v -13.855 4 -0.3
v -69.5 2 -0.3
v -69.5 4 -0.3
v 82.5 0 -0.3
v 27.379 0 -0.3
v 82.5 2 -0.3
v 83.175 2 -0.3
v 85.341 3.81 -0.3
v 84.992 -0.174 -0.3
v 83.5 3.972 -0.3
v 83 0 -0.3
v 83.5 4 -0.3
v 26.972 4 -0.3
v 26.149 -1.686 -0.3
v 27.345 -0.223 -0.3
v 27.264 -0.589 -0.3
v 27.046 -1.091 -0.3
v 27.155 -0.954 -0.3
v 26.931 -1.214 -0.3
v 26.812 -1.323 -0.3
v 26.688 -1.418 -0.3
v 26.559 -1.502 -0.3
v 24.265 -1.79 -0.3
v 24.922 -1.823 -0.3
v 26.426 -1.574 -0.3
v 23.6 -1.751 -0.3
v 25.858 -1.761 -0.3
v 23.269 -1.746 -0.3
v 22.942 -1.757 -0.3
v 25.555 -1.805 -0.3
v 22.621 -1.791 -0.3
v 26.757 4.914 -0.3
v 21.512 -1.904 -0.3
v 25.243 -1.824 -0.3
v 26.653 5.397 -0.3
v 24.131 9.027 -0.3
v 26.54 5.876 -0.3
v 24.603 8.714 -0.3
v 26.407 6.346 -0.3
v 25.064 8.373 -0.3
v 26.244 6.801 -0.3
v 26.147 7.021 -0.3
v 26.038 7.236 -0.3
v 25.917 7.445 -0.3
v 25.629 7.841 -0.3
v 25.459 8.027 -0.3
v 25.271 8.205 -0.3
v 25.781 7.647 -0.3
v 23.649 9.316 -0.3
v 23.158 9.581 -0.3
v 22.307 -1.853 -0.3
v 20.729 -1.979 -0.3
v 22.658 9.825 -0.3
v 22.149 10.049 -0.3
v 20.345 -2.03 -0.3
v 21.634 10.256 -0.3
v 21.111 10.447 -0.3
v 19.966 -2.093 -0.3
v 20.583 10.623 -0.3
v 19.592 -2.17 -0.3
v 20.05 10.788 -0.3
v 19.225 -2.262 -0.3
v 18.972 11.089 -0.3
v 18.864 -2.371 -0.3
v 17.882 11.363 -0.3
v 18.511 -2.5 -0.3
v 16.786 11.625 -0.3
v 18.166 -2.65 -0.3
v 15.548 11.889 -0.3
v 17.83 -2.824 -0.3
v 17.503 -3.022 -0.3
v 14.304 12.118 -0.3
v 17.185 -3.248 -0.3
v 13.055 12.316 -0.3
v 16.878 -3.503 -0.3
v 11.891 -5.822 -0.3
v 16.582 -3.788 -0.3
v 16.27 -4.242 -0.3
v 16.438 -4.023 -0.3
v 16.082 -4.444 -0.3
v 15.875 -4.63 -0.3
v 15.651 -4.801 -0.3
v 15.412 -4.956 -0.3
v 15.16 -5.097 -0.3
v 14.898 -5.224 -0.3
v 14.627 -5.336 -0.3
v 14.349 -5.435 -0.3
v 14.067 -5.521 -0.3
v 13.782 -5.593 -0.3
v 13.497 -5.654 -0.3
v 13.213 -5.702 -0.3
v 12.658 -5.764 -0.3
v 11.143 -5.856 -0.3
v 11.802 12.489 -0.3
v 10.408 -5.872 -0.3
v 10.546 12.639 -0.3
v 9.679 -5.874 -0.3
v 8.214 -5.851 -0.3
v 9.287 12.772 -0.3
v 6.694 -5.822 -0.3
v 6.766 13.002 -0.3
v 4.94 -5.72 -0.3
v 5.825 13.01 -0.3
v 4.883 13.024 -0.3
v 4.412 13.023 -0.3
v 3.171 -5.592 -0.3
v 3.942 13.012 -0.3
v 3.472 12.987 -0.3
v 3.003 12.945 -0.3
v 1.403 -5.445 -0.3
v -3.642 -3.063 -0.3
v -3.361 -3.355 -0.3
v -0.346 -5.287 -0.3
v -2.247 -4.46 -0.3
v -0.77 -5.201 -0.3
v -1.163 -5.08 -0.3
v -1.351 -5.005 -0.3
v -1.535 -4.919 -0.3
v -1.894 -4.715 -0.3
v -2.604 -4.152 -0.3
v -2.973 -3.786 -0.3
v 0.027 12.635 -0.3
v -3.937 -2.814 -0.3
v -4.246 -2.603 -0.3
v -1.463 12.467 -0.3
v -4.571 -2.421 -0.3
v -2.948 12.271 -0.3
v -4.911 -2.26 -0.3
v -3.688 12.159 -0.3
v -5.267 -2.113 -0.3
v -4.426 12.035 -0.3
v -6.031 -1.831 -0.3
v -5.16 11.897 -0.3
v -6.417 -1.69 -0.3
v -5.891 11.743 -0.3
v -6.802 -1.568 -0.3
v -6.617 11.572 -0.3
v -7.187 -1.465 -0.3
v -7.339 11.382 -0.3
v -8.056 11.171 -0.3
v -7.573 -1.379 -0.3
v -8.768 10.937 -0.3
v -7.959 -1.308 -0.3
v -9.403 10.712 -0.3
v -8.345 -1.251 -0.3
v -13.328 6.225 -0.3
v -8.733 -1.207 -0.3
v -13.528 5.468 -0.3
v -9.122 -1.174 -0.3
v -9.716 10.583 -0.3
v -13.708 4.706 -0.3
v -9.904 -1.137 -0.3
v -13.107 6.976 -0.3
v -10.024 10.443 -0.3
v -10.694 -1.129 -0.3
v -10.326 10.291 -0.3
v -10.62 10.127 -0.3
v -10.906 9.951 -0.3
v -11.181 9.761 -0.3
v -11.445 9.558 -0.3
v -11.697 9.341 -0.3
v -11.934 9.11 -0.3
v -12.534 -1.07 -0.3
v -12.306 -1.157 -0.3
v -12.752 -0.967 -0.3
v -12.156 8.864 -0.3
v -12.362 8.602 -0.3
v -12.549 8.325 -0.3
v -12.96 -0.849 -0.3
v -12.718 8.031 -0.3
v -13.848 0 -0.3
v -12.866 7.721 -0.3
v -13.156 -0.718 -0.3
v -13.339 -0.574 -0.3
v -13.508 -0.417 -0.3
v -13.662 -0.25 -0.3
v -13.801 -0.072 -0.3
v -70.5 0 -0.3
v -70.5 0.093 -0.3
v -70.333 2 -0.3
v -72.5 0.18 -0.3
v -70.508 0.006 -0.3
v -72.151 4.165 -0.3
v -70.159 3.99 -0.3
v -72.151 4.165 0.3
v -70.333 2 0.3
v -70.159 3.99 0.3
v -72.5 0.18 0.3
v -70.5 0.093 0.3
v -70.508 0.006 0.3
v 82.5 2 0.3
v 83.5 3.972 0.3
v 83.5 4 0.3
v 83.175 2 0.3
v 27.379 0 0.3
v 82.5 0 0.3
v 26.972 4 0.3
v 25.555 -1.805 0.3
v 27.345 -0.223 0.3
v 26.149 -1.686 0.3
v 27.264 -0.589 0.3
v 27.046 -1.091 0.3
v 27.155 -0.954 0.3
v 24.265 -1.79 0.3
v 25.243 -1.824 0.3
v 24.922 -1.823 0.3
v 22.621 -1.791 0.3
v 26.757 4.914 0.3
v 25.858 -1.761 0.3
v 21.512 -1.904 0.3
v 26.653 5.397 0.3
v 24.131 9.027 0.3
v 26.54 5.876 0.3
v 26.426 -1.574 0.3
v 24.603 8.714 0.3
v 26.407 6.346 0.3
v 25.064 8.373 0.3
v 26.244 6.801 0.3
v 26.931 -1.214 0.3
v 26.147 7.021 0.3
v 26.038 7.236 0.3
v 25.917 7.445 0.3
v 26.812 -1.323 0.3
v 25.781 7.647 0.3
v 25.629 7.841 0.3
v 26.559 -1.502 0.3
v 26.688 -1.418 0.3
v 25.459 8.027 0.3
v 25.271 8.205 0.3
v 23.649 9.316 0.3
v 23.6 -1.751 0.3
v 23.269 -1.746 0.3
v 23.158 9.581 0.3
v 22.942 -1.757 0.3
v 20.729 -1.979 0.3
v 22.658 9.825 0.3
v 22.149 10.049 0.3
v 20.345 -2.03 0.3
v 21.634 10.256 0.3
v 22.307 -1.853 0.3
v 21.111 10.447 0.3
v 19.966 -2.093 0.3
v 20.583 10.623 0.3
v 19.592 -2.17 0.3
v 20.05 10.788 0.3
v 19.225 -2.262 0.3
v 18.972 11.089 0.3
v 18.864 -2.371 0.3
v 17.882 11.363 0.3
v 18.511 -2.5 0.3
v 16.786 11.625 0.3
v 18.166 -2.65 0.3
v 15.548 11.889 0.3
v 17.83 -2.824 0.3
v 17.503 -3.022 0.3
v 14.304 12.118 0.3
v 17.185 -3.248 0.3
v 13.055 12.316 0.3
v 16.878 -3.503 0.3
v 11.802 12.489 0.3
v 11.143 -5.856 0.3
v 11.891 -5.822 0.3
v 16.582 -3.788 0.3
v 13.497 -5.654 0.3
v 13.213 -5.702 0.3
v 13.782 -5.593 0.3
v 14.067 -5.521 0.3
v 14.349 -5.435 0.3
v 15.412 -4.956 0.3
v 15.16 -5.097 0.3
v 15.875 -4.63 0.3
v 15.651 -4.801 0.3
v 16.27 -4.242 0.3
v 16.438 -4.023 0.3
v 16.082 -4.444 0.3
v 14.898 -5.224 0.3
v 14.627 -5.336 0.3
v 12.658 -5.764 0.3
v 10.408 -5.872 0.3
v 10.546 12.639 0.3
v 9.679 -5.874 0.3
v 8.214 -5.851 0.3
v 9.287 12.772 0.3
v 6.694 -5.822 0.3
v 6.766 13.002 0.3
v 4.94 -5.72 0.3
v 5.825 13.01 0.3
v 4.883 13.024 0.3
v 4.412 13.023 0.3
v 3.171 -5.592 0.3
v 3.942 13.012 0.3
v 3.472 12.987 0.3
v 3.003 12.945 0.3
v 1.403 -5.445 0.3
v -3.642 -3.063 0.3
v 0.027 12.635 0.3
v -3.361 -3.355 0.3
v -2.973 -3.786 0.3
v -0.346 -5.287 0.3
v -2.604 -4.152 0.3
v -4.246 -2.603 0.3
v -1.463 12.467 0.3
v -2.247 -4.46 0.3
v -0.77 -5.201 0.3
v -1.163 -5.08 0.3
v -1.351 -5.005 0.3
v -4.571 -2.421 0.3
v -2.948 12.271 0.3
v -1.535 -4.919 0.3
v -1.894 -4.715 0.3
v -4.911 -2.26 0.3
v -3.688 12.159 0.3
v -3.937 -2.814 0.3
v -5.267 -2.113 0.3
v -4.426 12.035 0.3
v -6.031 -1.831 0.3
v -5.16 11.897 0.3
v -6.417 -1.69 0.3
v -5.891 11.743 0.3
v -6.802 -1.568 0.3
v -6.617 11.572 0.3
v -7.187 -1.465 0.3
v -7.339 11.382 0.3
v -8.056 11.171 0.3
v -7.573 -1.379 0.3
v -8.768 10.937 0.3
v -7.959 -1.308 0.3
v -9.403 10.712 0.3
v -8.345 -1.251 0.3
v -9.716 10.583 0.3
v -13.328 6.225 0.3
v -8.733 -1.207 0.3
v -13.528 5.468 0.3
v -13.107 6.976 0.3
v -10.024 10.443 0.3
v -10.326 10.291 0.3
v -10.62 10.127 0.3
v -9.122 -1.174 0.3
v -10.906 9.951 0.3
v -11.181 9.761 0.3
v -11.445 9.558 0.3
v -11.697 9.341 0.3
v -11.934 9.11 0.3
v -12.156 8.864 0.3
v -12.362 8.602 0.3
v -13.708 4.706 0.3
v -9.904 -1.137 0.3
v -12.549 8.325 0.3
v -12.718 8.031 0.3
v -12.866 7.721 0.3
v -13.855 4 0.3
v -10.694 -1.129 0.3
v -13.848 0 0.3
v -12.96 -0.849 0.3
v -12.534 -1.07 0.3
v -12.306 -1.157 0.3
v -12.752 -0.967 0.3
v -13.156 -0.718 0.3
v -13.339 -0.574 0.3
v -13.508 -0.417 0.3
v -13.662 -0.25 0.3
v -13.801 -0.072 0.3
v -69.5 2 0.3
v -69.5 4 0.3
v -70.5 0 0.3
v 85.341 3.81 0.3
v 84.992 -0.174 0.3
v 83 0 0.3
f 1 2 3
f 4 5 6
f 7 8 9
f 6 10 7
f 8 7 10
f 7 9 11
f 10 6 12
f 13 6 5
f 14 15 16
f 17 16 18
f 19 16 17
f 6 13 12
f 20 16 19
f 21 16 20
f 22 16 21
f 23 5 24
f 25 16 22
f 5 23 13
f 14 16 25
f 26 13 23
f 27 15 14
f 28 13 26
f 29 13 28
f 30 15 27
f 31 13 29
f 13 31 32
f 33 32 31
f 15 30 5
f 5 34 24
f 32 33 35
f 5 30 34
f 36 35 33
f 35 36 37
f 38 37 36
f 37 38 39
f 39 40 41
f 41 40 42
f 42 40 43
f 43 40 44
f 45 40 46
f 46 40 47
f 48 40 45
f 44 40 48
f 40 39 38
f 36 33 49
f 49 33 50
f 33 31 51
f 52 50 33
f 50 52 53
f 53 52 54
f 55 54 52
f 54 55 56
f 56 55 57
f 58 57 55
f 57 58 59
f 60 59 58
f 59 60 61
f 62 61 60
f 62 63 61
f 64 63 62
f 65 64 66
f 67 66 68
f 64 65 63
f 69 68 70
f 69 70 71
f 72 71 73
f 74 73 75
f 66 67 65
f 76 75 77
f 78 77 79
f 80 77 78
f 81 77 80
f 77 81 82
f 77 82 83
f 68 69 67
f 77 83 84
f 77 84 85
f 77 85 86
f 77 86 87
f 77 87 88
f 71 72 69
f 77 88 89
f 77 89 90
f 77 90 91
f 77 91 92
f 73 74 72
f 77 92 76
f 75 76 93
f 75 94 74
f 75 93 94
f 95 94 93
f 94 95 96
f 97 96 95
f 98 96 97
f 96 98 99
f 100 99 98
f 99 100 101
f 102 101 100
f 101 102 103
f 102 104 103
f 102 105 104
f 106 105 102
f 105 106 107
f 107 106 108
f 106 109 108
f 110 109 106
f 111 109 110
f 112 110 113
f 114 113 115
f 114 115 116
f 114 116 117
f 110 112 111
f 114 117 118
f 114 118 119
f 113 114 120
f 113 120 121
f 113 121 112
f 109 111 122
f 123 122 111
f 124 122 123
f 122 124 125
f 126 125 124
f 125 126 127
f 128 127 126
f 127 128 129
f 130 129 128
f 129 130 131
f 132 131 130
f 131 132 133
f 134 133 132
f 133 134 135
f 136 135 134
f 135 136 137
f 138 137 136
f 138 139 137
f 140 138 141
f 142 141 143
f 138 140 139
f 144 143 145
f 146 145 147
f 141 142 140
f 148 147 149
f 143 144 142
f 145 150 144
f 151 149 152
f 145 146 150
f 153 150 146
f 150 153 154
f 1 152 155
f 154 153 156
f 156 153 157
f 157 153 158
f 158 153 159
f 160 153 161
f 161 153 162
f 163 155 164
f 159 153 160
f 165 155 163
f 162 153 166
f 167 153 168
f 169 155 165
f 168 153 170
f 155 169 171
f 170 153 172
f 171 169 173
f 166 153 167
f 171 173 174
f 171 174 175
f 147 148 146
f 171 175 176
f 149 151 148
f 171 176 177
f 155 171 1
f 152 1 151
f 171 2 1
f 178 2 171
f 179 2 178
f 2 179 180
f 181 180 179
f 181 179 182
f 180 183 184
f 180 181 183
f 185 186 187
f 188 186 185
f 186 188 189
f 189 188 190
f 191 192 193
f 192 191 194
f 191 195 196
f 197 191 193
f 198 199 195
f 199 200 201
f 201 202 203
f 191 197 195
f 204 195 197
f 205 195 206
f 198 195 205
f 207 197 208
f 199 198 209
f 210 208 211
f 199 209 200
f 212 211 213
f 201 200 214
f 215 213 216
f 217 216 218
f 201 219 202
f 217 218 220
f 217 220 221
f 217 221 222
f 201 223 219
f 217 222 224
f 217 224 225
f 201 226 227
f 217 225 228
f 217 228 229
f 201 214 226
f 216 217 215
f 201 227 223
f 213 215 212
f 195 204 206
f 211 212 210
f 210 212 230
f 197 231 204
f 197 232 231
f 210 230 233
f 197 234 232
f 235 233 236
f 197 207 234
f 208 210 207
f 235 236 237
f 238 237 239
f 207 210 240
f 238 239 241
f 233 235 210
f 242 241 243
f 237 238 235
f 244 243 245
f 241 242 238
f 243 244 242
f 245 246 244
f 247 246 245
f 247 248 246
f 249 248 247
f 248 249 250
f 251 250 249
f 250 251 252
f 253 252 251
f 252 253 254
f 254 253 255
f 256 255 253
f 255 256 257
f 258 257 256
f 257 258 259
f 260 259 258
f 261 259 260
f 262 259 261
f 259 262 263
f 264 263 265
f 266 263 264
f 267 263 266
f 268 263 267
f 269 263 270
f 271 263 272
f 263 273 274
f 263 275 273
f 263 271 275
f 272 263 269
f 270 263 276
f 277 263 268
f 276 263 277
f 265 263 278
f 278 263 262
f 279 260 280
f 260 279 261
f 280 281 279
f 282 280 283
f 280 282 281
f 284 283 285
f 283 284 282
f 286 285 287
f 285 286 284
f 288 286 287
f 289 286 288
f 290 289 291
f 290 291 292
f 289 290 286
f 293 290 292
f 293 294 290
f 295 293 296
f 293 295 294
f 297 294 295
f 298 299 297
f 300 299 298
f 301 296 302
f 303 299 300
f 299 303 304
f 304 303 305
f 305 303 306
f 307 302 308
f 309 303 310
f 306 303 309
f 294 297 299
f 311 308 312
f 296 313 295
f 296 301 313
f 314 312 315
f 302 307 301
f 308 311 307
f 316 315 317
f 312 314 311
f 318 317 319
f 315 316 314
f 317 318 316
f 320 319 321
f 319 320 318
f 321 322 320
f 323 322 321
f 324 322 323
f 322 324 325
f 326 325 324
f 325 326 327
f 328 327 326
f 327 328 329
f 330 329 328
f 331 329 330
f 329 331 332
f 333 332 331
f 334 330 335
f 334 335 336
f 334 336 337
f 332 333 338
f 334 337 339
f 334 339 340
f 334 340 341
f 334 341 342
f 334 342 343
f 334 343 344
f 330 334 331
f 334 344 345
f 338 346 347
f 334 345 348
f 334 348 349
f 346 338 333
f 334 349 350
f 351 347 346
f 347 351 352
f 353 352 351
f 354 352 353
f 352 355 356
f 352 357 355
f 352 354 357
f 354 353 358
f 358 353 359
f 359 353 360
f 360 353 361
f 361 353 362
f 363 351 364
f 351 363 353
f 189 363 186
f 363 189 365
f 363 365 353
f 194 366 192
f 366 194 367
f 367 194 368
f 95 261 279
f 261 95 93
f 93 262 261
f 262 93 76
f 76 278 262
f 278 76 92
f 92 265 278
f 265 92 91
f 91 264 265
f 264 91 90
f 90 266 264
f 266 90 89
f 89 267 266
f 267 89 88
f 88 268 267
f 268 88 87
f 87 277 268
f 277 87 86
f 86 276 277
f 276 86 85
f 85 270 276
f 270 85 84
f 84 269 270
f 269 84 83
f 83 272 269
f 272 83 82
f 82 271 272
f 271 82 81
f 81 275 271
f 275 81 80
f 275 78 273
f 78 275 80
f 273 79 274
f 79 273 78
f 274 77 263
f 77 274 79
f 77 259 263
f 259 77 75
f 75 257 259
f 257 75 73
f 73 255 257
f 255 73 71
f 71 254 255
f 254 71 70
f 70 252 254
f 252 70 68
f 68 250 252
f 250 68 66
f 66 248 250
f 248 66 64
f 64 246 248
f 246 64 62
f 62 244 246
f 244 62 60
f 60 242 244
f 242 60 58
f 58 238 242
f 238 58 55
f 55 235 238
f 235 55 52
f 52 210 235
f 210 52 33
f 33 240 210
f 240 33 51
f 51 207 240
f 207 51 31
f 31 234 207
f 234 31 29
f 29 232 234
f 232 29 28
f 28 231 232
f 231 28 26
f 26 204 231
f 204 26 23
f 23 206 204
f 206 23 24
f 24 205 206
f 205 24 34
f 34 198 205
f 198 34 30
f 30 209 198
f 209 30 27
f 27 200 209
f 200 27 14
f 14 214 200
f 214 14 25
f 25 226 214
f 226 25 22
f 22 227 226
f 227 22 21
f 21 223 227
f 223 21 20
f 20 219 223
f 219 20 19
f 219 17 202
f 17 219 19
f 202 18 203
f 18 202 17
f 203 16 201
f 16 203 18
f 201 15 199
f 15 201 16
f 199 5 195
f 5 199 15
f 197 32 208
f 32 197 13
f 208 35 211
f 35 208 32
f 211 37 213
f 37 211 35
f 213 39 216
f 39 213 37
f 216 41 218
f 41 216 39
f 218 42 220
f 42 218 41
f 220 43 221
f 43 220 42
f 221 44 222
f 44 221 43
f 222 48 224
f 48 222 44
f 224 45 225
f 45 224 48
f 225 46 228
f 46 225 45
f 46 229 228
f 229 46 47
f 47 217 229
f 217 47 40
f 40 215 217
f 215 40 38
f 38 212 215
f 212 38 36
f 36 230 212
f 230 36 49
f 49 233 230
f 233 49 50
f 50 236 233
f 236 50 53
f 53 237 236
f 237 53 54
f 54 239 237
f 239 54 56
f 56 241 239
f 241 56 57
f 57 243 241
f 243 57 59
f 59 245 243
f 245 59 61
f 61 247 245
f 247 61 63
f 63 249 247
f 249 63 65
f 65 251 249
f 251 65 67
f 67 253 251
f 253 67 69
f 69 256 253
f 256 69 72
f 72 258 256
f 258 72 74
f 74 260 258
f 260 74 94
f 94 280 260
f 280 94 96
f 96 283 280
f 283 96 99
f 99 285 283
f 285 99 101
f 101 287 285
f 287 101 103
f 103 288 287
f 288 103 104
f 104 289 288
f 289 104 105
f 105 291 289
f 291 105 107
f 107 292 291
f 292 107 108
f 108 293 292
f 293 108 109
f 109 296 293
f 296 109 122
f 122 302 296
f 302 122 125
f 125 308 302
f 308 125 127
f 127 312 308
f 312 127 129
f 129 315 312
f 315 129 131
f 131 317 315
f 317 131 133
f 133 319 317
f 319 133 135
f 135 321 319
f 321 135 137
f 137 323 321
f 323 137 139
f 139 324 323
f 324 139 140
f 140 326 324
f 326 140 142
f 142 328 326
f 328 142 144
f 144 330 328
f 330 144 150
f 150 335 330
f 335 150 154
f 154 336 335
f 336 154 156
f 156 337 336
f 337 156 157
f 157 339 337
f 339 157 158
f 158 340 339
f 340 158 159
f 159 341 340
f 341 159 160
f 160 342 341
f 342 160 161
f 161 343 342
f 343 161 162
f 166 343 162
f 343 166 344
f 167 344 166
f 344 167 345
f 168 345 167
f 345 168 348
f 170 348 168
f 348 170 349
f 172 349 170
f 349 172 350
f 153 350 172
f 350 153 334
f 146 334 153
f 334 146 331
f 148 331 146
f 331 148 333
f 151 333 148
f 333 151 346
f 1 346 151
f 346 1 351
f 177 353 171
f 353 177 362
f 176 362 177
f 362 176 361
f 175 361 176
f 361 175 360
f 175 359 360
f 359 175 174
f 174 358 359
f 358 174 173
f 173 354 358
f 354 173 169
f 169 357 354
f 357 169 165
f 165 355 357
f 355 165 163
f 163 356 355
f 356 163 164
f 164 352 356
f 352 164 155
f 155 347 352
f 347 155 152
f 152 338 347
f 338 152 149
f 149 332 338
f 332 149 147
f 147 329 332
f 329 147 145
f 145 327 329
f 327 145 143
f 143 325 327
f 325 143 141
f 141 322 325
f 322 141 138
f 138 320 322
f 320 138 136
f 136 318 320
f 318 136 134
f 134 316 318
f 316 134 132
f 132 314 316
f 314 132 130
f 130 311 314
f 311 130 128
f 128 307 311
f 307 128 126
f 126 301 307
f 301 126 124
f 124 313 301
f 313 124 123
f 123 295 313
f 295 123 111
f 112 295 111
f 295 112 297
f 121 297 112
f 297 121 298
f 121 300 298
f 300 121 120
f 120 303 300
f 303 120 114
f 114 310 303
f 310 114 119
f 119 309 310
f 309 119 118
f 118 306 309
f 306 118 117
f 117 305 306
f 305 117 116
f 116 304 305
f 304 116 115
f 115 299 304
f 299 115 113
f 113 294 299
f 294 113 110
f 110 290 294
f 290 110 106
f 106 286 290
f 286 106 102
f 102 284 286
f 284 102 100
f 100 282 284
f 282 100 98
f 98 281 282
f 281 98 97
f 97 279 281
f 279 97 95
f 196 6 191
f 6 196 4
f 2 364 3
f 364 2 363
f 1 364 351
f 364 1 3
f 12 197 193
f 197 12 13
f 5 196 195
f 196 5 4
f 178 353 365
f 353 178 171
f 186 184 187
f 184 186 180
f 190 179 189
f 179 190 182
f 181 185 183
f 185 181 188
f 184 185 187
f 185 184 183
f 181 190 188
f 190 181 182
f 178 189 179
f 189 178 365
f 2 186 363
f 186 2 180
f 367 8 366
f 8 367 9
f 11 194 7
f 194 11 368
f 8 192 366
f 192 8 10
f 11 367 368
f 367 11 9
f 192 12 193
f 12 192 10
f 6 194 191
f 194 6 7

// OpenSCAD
File = "HeadLampLens.dxf";
Width = 42;
Height = 19;
Thickness = .6;
MountSize = 2;
DXFWidthOffset = 6.5;
StrapLength = 55;

echo(str("Width Scale: ", Width / dxf_dim(file = File, name = "total_width")));
echo(str("Height Scale: ", Height / dxf_dim(file = File, name = "total_height")));


linear_extrude(height = Thickness, center = true, convexity = 10) scale([42/dxf_dim(file = "HeadLampLens.dxf", name = "total_width"),19/dxf_dim(file = "HeadLampLens.dxf", name = "total_height"),0]) import(file = File,  layer = "Layer");

// Strap
translate([DXFWidthOffset - StrapLength - Width/2,0,-.3]) cube([StrapLength+StrapLength+Width, 4, .6]);
// Side latch
translate([DXFWidthOffset - StrapLength - Width/2 -3,.18,-.3]) rotate(a=-5) cube([2, 4, .6]);
translate([DXFWidthOffset - StrapLength - Width/2 -1,0,-.3]) cube([1, 2, .6]);
// Side latch
translate([-(DXFWidthOffset - StrapLength - Width) -7.5,0,-.3]) rotate(a=-5) cube([2, 4, .6]);
translate([-(DXFWidthOffset - StrapLength - Width) -8,2,-.3]) cube([1, 2, .6]);


// Mounting Balls
//translate([Width/2 + DXFWidthOffset - MountSize,0,MountSize]) sphere(r=MountSize, center=true);
//translate([-Width/2 + DXFWidthOffset + MountSize,0,MountSize]) sphere(r=MountSize, center=true);
